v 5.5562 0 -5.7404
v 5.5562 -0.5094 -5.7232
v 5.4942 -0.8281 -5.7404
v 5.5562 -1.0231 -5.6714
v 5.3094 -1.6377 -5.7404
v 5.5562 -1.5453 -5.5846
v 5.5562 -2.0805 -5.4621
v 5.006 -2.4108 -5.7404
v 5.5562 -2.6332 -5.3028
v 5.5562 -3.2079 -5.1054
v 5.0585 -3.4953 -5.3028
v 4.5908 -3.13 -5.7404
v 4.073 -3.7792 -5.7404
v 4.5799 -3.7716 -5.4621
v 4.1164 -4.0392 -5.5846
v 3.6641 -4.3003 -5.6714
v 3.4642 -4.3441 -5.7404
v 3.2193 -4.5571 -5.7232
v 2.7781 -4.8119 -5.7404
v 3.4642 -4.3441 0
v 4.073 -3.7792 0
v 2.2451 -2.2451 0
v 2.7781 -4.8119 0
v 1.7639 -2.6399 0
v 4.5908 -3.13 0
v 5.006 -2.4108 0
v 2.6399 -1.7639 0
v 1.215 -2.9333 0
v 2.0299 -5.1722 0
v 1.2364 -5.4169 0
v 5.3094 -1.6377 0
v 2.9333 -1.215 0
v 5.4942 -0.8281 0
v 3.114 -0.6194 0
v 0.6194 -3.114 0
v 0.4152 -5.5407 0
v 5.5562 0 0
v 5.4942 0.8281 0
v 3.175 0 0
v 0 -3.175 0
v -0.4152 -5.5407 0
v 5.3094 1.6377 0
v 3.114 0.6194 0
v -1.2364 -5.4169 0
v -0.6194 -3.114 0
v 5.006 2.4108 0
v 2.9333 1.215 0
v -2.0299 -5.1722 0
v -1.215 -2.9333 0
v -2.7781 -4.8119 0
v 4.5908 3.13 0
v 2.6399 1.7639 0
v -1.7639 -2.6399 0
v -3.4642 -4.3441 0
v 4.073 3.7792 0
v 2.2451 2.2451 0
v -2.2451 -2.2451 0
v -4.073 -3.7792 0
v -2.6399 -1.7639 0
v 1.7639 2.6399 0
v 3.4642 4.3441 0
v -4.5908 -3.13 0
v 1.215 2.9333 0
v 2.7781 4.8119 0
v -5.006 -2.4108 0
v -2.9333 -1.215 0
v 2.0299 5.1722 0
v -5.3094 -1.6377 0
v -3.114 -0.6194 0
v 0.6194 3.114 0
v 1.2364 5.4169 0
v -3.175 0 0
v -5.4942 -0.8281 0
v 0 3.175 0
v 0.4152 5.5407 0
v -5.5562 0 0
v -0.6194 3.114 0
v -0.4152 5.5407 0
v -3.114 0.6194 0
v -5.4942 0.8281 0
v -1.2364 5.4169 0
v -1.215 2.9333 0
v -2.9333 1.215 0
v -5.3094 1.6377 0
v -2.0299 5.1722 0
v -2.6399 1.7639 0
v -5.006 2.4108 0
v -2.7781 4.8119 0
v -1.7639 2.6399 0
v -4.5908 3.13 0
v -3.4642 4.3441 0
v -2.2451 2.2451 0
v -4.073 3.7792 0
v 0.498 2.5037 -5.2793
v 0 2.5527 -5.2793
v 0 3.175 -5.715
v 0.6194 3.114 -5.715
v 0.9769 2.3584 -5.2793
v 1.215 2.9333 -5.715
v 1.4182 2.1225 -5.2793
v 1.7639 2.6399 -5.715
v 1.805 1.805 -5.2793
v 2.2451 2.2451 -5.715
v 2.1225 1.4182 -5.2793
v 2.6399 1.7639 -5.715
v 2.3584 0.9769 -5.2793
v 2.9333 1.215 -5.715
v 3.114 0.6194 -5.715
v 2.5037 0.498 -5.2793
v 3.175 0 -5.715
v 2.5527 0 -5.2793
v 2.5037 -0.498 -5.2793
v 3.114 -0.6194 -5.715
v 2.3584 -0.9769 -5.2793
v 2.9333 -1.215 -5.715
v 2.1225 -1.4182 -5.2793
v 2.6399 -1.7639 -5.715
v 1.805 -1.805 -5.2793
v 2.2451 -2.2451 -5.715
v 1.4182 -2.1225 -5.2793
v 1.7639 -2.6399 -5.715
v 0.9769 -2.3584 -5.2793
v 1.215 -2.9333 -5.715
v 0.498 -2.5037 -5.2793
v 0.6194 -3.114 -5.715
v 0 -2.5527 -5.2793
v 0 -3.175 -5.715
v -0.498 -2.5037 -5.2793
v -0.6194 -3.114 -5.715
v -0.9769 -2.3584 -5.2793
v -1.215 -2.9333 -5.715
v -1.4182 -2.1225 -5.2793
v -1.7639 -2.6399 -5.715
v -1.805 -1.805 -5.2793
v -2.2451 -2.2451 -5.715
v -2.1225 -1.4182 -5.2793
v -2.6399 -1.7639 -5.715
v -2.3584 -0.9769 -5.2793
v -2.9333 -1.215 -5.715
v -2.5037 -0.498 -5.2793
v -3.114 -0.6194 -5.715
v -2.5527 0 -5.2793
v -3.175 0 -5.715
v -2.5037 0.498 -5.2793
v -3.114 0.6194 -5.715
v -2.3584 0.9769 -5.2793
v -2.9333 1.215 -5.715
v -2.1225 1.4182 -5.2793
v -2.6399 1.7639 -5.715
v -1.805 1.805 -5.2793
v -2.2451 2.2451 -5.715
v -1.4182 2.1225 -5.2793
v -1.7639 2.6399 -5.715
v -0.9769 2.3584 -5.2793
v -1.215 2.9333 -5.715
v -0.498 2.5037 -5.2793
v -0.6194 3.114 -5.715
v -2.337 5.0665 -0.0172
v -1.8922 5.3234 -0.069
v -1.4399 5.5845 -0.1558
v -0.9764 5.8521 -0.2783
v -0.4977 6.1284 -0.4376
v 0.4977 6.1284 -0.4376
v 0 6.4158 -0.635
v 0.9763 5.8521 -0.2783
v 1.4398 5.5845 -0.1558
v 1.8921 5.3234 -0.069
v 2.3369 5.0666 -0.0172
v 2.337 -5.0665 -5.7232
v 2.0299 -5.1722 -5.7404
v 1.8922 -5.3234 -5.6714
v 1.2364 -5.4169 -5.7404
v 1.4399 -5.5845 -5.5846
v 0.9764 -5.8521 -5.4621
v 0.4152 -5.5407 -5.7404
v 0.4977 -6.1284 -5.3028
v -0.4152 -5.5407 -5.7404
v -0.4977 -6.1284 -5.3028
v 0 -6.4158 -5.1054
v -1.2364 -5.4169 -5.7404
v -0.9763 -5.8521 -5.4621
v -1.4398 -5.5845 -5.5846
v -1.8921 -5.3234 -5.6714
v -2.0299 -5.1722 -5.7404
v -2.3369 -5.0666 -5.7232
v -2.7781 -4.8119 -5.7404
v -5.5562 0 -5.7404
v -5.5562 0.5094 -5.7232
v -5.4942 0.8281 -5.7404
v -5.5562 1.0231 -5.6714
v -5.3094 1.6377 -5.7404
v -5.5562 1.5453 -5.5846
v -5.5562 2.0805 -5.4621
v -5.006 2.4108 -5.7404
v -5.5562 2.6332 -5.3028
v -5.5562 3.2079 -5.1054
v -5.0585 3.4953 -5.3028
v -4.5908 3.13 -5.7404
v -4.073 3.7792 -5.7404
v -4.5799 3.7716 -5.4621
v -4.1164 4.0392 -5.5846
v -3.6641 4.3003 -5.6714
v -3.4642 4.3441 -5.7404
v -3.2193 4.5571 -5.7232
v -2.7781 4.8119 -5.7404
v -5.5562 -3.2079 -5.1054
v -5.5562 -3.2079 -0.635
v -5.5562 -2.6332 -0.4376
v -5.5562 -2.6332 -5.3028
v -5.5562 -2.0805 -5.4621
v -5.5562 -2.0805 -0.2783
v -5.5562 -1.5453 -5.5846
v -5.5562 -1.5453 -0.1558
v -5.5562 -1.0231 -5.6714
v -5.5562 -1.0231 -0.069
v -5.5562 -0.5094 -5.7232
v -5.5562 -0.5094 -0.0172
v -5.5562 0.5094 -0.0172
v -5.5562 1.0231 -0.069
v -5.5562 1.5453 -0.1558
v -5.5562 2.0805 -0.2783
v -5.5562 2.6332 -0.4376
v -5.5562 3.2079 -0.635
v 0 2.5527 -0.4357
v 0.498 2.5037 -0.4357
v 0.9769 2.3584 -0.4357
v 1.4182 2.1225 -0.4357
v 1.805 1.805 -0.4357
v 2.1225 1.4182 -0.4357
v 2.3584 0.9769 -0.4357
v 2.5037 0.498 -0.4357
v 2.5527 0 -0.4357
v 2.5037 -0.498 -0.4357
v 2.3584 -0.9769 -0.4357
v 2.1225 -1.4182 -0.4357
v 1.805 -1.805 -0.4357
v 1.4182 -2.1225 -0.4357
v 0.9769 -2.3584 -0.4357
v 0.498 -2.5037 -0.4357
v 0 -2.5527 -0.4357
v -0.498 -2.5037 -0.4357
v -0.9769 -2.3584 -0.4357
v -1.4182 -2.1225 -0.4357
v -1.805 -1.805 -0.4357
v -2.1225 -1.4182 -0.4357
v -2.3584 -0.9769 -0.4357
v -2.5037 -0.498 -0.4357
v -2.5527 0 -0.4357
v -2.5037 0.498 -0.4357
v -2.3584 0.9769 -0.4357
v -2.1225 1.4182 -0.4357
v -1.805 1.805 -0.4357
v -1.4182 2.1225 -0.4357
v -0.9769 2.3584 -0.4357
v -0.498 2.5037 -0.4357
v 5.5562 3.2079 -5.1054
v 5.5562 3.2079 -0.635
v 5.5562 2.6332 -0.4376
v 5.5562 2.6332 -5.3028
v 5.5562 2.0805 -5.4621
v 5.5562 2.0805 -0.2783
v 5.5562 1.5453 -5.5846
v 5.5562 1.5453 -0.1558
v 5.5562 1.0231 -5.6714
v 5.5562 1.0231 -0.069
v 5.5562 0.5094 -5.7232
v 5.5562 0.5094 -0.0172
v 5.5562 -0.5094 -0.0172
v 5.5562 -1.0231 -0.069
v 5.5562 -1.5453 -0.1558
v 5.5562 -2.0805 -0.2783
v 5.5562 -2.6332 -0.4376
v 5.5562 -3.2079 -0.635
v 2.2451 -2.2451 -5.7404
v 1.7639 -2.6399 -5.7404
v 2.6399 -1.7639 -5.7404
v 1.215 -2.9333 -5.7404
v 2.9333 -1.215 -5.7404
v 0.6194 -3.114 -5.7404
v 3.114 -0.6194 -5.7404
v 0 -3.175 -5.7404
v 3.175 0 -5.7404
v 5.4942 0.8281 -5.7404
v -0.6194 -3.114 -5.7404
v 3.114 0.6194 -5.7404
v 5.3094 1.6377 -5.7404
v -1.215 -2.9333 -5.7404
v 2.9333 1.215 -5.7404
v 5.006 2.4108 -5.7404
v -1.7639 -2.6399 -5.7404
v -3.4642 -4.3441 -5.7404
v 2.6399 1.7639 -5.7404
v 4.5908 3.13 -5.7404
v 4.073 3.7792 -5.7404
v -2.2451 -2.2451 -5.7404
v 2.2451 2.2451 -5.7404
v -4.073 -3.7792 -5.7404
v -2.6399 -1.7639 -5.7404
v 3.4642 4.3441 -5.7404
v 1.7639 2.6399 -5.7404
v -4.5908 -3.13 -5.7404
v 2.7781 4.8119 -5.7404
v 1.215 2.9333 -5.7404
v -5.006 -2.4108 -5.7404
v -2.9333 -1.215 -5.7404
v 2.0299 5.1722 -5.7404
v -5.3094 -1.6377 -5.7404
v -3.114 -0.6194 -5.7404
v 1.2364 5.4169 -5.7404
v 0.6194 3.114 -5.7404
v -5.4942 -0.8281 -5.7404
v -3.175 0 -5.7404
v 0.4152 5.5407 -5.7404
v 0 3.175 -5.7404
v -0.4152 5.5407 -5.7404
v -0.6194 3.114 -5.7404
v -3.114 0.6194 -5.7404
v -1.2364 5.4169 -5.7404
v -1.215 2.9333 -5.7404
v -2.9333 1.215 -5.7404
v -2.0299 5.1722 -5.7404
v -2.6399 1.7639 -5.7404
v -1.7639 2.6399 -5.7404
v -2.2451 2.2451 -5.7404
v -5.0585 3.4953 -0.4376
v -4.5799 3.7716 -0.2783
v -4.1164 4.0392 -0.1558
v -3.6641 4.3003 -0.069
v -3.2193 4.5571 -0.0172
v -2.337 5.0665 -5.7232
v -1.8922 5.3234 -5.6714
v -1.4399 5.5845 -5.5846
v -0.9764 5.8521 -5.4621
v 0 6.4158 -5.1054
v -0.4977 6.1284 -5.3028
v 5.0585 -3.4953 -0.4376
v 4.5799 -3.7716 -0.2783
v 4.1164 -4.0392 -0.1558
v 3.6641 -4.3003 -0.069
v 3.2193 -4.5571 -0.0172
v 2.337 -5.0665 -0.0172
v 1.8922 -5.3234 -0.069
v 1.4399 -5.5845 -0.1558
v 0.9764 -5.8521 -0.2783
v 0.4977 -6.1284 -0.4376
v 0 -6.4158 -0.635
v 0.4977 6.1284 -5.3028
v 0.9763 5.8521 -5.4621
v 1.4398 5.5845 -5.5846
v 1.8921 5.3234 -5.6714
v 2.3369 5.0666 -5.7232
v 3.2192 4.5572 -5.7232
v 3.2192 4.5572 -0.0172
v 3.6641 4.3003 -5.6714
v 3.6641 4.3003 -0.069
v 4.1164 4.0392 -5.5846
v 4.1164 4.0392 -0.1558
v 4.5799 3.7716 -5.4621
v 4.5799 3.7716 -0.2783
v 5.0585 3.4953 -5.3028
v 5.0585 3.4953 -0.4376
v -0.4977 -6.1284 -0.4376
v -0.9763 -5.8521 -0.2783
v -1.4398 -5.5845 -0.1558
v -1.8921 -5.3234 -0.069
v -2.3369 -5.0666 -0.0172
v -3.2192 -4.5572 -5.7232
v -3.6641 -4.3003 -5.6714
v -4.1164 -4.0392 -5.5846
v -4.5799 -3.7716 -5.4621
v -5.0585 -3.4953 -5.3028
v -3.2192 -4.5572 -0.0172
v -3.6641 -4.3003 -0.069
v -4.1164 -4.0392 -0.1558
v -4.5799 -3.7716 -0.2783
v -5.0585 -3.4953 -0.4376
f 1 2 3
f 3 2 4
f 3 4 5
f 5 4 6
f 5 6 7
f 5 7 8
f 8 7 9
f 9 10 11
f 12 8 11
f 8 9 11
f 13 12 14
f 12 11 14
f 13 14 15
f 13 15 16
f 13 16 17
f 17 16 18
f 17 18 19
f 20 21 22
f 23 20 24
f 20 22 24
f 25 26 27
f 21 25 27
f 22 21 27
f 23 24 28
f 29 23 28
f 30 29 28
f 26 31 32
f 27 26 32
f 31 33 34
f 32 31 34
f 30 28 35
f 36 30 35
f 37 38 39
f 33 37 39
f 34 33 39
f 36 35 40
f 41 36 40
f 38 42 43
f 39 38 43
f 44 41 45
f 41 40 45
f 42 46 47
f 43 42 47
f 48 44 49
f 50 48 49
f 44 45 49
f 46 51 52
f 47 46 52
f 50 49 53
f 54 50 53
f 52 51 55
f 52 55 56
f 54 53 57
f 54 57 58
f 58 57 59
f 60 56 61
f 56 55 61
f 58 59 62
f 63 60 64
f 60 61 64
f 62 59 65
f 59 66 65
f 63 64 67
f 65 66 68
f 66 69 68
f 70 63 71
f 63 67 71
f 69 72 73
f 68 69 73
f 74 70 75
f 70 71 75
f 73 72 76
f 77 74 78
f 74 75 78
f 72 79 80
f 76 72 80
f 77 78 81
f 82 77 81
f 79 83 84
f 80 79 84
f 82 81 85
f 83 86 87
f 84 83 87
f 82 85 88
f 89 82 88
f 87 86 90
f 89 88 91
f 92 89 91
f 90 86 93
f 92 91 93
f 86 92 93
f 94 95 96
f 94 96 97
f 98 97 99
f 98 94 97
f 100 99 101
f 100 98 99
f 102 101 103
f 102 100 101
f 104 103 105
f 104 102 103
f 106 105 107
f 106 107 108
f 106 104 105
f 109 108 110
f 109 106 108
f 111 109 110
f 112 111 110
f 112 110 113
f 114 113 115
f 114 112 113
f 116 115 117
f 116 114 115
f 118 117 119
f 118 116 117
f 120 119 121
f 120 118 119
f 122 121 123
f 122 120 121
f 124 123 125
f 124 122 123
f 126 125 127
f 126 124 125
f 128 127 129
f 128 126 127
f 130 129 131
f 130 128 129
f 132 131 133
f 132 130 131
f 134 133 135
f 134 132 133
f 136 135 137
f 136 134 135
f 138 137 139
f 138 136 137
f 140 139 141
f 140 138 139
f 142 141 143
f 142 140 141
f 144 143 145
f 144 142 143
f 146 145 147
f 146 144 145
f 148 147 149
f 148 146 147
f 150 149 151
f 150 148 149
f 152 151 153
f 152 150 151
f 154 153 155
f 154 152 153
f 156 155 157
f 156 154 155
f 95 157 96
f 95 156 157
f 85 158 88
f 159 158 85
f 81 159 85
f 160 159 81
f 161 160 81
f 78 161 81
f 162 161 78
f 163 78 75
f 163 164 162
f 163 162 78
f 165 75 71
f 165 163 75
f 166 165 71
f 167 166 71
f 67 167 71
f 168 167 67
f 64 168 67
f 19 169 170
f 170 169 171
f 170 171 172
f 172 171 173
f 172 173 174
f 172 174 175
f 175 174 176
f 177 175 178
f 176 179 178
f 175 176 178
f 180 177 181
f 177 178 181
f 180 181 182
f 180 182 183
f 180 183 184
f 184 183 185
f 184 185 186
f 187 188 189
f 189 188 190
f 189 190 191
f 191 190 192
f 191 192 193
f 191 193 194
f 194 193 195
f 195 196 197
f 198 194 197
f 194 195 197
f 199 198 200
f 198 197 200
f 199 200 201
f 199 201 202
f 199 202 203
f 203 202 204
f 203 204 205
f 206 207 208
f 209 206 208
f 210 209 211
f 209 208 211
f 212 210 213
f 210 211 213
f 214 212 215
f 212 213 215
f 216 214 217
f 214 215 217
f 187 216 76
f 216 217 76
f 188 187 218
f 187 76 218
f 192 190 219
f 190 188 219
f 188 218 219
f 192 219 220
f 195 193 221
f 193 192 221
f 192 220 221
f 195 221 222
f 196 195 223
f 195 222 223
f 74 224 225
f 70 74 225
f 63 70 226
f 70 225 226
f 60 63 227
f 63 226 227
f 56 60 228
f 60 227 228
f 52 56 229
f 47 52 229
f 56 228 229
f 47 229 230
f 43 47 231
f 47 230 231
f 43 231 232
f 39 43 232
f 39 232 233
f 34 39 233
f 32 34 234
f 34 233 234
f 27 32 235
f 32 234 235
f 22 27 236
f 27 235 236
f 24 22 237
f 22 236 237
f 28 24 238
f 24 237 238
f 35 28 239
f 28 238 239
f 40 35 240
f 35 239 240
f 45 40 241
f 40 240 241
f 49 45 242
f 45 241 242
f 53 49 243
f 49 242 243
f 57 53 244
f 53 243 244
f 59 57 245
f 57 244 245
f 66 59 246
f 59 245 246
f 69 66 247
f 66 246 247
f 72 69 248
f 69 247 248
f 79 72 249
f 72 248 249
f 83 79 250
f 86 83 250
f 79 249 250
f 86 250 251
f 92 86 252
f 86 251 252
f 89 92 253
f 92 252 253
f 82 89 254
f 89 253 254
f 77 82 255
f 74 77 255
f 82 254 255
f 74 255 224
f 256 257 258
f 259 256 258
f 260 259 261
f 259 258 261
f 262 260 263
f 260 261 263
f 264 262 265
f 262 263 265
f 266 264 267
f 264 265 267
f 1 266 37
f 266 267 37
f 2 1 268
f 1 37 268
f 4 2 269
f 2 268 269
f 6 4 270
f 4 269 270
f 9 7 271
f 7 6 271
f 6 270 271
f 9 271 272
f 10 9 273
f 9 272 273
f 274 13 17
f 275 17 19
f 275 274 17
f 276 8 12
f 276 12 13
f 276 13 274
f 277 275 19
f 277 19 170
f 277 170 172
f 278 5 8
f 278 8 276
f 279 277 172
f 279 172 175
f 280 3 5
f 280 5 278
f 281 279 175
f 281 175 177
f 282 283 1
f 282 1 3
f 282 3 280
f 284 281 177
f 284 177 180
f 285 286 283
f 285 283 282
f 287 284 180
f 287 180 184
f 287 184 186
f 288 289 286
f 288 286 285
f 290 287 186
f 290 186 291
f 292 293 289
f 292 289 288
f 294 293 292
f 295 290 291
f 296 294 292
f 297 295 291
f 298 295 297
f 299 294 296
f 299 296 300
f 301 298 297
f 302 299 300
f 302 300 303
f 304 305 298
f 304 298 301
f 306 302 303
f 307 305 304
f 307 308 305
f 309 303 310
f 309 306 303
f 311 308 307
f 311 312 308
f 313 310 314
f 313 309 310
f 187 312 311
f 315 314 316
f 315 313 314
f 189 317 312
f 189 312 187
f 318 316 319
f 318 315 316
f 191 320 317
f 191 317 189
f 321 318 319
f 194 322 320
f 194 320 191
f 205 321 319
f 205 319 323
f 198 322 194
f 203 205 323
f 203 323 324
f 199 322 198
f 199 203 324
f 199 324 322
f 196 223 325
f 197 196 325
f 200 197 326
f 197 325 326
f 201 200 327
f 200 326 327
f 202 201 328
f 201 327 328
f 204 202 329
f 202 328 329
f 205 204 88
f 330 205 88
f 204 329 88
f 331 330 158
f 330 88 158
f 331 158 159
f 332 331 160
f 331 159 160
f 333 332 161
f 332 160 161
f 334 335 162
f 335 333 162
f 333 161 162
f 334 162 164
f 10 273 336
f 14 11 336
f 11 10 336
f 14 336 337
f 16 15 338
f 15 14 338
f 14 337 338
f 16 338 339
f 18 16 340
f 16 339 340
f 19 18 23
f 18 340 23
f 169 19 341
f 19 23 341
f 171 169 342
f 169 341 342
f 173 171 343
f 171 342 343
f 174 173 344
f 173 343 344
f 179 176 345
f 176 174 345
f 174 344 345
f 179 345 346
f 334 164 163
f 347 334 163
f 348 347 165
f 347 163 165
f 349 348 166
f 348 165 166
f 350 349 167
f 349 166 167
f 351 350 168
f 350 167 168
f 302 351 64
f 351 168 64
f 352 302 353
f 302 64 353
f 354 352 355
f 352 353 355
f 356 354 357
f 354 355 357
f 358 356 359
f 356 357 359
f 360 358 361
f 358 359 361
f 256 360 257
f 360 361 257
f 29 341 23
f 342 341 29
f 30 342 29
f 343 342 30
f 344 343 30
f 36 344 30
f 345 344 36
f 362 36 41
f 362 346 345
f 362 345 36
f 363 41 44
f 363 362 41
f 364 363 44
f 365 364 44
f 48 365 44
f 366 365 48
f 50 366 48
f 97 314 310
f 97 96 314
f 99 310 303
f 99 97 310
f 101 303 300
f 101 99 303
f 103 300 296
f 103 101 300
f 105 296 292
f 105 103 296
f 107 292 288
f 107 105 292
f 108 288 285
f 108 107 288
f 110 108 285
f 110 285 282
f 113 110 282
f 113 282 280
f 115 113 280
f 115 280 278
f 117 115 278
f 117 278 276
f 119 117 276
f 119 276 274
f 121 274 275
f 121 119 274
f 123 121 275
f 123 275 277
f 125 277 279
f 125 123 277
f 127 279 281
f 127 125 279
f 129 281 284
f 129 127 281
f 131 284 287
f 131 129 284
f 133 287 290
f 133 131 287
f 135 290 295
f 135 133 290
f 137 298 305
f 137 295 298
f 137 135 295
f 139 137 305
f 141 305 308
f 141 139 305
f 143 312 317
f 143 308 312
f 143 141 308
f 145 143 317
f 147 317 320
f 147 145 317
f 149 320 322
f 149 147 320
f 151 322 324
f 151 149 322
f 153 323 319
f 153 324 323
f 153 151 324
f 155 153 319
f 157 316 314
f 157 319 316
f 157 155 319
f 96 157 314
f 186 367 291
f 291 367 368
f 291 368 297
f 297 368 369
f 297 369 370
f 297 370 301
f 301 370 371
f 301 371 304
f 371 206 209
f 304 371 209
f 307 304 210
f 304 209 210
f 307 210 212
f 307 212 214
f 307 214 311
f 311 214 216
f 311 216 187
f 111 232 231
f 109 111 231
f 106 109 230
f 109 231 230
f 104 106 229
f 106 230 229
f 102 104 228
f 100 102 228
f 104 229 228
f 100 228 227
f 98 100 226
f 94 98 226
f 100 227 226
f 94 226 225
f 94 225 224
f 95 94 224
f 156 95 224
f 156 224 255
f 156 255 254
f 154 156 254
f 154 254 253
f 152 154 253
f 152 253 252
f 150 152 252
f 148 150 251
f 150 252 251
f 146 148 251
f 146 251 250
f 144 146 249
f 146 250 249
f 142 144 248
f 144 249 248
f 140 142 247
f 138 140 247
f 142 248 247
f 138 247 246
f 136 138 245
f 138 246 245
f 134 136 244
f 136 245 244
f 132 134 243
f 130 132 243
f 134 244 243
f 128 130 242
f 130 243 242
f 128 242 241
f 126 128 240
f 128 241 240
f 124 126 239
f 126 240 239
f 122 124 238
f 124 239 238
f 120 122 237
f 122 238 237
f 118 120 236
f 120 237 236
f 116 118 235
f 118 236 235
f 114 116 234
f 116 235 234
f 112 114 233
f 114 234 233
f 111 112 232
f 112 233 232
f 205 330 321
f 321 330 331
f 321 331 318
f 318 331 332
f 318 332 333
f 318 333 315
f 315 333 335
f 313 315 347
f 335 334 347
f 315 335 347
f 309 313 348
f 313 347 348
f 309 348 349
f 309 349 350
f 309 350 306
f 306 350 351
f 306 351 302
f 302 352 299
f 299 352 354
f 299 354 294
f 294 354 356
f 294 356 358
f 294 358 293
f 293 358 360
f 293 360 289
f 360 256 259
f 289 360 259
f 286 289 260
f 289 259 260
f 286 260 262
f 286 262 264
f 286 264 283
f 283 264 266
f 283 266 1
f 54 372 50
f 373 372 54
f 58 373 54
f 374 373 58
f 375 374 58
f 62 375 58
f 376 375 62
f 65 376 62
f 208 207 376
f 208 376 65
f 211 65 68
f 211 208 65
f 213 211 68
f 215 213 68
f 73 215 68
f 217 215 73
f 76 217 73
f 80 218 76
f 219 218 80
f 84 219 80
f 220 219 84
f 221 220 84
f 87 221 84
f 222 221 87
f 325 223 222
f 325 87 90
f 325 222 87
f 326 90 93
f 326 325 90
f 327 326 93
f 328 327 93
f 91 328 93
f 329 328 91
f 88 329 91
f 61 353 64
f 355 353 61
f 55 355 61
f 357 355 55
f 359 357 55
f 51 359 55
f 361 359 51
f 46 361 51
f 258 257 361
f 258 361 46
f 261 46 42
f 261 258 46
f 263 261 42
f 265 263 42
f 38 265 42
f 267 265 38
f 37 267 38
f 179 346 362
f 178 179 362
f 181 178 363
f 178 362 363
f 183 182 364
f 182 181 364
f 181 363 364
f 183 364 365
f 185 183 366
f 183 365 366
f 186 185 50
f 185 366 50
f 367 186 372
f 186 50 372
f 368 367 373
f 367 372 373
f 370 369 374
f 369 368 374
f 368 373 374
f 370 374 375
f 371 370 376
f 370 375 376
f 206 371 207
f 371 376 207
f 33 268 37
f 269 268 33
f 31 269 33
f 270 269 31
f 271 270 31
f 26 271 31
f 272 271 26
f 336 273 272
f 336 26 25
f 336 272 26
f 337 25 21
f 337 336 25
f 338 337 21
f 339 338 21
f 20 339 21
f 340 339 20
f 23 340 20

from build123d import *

# Parameters (mm, degrees)
BASENUTSKE_R  = 2.5527
BASENUT_DEPTH = 5.7404


with BuildPart() as part:
    # BaseNutSke → BaseNut (new body)
    with BuildSketch(Plane.XY):
        Polygon((5.55625, 3.207902433), (5.55625, -3.207902433), (0, -6.415804866), (-5.55625, -3.207902433), (-5.55625, 3.207902433), (0, 6.415804866), align=None)
        Circle(BASENUTSKE_R, mode=Mode.SUBTRACT)
    extrude(amount=-BASENUT_DEPTH)

    # Sketch3 → Double-Chamfer (revolve, cut)
    with BuildSketch(Plane(origin=(0, 0, 0), x_dir=(0, 0, -1), z_dir=(1, 0, 0))):
        Polygon((5.7404, 5.55625), (5.1054, 6.415804866), (5.1054, 19.115804866), (18.4404, 19.115804866), (18.4404, 5.55625), align=None)
        Polygon((0.635, 19.115804866), (-12.7, 19.115804866), (-12.7, 5.55625), (0, 5.55625), (0.635, 6.415804866), align=None)
    revolve(axis=Axis((0, 0, 0), (0, 0, -1)), mode=Mode.SUBTRACT)

    # Sketch5 → EndChamfer (revolve, cut)
    with BuildSketch(Plane(origin=(0, 0, 0), x_dir=(0, 0, -1), z_dir=(1, 0, 0))):
        Polygon((5.715, 3.175), (5.235686934, 2.49047), (5.7658, 2.49047), (5.7658, 3.175), align=None)
        Polygon((-0.0508, 3.175), (0, 3.175), (0.479313066, 2.49047), (-0.0508, 2.49047), align=None)
    revolve(axis=Axis((0, 0, -25.037505729), (0, 0, -1)), mode=Mode.SUBTRACT)


solid = part.part
